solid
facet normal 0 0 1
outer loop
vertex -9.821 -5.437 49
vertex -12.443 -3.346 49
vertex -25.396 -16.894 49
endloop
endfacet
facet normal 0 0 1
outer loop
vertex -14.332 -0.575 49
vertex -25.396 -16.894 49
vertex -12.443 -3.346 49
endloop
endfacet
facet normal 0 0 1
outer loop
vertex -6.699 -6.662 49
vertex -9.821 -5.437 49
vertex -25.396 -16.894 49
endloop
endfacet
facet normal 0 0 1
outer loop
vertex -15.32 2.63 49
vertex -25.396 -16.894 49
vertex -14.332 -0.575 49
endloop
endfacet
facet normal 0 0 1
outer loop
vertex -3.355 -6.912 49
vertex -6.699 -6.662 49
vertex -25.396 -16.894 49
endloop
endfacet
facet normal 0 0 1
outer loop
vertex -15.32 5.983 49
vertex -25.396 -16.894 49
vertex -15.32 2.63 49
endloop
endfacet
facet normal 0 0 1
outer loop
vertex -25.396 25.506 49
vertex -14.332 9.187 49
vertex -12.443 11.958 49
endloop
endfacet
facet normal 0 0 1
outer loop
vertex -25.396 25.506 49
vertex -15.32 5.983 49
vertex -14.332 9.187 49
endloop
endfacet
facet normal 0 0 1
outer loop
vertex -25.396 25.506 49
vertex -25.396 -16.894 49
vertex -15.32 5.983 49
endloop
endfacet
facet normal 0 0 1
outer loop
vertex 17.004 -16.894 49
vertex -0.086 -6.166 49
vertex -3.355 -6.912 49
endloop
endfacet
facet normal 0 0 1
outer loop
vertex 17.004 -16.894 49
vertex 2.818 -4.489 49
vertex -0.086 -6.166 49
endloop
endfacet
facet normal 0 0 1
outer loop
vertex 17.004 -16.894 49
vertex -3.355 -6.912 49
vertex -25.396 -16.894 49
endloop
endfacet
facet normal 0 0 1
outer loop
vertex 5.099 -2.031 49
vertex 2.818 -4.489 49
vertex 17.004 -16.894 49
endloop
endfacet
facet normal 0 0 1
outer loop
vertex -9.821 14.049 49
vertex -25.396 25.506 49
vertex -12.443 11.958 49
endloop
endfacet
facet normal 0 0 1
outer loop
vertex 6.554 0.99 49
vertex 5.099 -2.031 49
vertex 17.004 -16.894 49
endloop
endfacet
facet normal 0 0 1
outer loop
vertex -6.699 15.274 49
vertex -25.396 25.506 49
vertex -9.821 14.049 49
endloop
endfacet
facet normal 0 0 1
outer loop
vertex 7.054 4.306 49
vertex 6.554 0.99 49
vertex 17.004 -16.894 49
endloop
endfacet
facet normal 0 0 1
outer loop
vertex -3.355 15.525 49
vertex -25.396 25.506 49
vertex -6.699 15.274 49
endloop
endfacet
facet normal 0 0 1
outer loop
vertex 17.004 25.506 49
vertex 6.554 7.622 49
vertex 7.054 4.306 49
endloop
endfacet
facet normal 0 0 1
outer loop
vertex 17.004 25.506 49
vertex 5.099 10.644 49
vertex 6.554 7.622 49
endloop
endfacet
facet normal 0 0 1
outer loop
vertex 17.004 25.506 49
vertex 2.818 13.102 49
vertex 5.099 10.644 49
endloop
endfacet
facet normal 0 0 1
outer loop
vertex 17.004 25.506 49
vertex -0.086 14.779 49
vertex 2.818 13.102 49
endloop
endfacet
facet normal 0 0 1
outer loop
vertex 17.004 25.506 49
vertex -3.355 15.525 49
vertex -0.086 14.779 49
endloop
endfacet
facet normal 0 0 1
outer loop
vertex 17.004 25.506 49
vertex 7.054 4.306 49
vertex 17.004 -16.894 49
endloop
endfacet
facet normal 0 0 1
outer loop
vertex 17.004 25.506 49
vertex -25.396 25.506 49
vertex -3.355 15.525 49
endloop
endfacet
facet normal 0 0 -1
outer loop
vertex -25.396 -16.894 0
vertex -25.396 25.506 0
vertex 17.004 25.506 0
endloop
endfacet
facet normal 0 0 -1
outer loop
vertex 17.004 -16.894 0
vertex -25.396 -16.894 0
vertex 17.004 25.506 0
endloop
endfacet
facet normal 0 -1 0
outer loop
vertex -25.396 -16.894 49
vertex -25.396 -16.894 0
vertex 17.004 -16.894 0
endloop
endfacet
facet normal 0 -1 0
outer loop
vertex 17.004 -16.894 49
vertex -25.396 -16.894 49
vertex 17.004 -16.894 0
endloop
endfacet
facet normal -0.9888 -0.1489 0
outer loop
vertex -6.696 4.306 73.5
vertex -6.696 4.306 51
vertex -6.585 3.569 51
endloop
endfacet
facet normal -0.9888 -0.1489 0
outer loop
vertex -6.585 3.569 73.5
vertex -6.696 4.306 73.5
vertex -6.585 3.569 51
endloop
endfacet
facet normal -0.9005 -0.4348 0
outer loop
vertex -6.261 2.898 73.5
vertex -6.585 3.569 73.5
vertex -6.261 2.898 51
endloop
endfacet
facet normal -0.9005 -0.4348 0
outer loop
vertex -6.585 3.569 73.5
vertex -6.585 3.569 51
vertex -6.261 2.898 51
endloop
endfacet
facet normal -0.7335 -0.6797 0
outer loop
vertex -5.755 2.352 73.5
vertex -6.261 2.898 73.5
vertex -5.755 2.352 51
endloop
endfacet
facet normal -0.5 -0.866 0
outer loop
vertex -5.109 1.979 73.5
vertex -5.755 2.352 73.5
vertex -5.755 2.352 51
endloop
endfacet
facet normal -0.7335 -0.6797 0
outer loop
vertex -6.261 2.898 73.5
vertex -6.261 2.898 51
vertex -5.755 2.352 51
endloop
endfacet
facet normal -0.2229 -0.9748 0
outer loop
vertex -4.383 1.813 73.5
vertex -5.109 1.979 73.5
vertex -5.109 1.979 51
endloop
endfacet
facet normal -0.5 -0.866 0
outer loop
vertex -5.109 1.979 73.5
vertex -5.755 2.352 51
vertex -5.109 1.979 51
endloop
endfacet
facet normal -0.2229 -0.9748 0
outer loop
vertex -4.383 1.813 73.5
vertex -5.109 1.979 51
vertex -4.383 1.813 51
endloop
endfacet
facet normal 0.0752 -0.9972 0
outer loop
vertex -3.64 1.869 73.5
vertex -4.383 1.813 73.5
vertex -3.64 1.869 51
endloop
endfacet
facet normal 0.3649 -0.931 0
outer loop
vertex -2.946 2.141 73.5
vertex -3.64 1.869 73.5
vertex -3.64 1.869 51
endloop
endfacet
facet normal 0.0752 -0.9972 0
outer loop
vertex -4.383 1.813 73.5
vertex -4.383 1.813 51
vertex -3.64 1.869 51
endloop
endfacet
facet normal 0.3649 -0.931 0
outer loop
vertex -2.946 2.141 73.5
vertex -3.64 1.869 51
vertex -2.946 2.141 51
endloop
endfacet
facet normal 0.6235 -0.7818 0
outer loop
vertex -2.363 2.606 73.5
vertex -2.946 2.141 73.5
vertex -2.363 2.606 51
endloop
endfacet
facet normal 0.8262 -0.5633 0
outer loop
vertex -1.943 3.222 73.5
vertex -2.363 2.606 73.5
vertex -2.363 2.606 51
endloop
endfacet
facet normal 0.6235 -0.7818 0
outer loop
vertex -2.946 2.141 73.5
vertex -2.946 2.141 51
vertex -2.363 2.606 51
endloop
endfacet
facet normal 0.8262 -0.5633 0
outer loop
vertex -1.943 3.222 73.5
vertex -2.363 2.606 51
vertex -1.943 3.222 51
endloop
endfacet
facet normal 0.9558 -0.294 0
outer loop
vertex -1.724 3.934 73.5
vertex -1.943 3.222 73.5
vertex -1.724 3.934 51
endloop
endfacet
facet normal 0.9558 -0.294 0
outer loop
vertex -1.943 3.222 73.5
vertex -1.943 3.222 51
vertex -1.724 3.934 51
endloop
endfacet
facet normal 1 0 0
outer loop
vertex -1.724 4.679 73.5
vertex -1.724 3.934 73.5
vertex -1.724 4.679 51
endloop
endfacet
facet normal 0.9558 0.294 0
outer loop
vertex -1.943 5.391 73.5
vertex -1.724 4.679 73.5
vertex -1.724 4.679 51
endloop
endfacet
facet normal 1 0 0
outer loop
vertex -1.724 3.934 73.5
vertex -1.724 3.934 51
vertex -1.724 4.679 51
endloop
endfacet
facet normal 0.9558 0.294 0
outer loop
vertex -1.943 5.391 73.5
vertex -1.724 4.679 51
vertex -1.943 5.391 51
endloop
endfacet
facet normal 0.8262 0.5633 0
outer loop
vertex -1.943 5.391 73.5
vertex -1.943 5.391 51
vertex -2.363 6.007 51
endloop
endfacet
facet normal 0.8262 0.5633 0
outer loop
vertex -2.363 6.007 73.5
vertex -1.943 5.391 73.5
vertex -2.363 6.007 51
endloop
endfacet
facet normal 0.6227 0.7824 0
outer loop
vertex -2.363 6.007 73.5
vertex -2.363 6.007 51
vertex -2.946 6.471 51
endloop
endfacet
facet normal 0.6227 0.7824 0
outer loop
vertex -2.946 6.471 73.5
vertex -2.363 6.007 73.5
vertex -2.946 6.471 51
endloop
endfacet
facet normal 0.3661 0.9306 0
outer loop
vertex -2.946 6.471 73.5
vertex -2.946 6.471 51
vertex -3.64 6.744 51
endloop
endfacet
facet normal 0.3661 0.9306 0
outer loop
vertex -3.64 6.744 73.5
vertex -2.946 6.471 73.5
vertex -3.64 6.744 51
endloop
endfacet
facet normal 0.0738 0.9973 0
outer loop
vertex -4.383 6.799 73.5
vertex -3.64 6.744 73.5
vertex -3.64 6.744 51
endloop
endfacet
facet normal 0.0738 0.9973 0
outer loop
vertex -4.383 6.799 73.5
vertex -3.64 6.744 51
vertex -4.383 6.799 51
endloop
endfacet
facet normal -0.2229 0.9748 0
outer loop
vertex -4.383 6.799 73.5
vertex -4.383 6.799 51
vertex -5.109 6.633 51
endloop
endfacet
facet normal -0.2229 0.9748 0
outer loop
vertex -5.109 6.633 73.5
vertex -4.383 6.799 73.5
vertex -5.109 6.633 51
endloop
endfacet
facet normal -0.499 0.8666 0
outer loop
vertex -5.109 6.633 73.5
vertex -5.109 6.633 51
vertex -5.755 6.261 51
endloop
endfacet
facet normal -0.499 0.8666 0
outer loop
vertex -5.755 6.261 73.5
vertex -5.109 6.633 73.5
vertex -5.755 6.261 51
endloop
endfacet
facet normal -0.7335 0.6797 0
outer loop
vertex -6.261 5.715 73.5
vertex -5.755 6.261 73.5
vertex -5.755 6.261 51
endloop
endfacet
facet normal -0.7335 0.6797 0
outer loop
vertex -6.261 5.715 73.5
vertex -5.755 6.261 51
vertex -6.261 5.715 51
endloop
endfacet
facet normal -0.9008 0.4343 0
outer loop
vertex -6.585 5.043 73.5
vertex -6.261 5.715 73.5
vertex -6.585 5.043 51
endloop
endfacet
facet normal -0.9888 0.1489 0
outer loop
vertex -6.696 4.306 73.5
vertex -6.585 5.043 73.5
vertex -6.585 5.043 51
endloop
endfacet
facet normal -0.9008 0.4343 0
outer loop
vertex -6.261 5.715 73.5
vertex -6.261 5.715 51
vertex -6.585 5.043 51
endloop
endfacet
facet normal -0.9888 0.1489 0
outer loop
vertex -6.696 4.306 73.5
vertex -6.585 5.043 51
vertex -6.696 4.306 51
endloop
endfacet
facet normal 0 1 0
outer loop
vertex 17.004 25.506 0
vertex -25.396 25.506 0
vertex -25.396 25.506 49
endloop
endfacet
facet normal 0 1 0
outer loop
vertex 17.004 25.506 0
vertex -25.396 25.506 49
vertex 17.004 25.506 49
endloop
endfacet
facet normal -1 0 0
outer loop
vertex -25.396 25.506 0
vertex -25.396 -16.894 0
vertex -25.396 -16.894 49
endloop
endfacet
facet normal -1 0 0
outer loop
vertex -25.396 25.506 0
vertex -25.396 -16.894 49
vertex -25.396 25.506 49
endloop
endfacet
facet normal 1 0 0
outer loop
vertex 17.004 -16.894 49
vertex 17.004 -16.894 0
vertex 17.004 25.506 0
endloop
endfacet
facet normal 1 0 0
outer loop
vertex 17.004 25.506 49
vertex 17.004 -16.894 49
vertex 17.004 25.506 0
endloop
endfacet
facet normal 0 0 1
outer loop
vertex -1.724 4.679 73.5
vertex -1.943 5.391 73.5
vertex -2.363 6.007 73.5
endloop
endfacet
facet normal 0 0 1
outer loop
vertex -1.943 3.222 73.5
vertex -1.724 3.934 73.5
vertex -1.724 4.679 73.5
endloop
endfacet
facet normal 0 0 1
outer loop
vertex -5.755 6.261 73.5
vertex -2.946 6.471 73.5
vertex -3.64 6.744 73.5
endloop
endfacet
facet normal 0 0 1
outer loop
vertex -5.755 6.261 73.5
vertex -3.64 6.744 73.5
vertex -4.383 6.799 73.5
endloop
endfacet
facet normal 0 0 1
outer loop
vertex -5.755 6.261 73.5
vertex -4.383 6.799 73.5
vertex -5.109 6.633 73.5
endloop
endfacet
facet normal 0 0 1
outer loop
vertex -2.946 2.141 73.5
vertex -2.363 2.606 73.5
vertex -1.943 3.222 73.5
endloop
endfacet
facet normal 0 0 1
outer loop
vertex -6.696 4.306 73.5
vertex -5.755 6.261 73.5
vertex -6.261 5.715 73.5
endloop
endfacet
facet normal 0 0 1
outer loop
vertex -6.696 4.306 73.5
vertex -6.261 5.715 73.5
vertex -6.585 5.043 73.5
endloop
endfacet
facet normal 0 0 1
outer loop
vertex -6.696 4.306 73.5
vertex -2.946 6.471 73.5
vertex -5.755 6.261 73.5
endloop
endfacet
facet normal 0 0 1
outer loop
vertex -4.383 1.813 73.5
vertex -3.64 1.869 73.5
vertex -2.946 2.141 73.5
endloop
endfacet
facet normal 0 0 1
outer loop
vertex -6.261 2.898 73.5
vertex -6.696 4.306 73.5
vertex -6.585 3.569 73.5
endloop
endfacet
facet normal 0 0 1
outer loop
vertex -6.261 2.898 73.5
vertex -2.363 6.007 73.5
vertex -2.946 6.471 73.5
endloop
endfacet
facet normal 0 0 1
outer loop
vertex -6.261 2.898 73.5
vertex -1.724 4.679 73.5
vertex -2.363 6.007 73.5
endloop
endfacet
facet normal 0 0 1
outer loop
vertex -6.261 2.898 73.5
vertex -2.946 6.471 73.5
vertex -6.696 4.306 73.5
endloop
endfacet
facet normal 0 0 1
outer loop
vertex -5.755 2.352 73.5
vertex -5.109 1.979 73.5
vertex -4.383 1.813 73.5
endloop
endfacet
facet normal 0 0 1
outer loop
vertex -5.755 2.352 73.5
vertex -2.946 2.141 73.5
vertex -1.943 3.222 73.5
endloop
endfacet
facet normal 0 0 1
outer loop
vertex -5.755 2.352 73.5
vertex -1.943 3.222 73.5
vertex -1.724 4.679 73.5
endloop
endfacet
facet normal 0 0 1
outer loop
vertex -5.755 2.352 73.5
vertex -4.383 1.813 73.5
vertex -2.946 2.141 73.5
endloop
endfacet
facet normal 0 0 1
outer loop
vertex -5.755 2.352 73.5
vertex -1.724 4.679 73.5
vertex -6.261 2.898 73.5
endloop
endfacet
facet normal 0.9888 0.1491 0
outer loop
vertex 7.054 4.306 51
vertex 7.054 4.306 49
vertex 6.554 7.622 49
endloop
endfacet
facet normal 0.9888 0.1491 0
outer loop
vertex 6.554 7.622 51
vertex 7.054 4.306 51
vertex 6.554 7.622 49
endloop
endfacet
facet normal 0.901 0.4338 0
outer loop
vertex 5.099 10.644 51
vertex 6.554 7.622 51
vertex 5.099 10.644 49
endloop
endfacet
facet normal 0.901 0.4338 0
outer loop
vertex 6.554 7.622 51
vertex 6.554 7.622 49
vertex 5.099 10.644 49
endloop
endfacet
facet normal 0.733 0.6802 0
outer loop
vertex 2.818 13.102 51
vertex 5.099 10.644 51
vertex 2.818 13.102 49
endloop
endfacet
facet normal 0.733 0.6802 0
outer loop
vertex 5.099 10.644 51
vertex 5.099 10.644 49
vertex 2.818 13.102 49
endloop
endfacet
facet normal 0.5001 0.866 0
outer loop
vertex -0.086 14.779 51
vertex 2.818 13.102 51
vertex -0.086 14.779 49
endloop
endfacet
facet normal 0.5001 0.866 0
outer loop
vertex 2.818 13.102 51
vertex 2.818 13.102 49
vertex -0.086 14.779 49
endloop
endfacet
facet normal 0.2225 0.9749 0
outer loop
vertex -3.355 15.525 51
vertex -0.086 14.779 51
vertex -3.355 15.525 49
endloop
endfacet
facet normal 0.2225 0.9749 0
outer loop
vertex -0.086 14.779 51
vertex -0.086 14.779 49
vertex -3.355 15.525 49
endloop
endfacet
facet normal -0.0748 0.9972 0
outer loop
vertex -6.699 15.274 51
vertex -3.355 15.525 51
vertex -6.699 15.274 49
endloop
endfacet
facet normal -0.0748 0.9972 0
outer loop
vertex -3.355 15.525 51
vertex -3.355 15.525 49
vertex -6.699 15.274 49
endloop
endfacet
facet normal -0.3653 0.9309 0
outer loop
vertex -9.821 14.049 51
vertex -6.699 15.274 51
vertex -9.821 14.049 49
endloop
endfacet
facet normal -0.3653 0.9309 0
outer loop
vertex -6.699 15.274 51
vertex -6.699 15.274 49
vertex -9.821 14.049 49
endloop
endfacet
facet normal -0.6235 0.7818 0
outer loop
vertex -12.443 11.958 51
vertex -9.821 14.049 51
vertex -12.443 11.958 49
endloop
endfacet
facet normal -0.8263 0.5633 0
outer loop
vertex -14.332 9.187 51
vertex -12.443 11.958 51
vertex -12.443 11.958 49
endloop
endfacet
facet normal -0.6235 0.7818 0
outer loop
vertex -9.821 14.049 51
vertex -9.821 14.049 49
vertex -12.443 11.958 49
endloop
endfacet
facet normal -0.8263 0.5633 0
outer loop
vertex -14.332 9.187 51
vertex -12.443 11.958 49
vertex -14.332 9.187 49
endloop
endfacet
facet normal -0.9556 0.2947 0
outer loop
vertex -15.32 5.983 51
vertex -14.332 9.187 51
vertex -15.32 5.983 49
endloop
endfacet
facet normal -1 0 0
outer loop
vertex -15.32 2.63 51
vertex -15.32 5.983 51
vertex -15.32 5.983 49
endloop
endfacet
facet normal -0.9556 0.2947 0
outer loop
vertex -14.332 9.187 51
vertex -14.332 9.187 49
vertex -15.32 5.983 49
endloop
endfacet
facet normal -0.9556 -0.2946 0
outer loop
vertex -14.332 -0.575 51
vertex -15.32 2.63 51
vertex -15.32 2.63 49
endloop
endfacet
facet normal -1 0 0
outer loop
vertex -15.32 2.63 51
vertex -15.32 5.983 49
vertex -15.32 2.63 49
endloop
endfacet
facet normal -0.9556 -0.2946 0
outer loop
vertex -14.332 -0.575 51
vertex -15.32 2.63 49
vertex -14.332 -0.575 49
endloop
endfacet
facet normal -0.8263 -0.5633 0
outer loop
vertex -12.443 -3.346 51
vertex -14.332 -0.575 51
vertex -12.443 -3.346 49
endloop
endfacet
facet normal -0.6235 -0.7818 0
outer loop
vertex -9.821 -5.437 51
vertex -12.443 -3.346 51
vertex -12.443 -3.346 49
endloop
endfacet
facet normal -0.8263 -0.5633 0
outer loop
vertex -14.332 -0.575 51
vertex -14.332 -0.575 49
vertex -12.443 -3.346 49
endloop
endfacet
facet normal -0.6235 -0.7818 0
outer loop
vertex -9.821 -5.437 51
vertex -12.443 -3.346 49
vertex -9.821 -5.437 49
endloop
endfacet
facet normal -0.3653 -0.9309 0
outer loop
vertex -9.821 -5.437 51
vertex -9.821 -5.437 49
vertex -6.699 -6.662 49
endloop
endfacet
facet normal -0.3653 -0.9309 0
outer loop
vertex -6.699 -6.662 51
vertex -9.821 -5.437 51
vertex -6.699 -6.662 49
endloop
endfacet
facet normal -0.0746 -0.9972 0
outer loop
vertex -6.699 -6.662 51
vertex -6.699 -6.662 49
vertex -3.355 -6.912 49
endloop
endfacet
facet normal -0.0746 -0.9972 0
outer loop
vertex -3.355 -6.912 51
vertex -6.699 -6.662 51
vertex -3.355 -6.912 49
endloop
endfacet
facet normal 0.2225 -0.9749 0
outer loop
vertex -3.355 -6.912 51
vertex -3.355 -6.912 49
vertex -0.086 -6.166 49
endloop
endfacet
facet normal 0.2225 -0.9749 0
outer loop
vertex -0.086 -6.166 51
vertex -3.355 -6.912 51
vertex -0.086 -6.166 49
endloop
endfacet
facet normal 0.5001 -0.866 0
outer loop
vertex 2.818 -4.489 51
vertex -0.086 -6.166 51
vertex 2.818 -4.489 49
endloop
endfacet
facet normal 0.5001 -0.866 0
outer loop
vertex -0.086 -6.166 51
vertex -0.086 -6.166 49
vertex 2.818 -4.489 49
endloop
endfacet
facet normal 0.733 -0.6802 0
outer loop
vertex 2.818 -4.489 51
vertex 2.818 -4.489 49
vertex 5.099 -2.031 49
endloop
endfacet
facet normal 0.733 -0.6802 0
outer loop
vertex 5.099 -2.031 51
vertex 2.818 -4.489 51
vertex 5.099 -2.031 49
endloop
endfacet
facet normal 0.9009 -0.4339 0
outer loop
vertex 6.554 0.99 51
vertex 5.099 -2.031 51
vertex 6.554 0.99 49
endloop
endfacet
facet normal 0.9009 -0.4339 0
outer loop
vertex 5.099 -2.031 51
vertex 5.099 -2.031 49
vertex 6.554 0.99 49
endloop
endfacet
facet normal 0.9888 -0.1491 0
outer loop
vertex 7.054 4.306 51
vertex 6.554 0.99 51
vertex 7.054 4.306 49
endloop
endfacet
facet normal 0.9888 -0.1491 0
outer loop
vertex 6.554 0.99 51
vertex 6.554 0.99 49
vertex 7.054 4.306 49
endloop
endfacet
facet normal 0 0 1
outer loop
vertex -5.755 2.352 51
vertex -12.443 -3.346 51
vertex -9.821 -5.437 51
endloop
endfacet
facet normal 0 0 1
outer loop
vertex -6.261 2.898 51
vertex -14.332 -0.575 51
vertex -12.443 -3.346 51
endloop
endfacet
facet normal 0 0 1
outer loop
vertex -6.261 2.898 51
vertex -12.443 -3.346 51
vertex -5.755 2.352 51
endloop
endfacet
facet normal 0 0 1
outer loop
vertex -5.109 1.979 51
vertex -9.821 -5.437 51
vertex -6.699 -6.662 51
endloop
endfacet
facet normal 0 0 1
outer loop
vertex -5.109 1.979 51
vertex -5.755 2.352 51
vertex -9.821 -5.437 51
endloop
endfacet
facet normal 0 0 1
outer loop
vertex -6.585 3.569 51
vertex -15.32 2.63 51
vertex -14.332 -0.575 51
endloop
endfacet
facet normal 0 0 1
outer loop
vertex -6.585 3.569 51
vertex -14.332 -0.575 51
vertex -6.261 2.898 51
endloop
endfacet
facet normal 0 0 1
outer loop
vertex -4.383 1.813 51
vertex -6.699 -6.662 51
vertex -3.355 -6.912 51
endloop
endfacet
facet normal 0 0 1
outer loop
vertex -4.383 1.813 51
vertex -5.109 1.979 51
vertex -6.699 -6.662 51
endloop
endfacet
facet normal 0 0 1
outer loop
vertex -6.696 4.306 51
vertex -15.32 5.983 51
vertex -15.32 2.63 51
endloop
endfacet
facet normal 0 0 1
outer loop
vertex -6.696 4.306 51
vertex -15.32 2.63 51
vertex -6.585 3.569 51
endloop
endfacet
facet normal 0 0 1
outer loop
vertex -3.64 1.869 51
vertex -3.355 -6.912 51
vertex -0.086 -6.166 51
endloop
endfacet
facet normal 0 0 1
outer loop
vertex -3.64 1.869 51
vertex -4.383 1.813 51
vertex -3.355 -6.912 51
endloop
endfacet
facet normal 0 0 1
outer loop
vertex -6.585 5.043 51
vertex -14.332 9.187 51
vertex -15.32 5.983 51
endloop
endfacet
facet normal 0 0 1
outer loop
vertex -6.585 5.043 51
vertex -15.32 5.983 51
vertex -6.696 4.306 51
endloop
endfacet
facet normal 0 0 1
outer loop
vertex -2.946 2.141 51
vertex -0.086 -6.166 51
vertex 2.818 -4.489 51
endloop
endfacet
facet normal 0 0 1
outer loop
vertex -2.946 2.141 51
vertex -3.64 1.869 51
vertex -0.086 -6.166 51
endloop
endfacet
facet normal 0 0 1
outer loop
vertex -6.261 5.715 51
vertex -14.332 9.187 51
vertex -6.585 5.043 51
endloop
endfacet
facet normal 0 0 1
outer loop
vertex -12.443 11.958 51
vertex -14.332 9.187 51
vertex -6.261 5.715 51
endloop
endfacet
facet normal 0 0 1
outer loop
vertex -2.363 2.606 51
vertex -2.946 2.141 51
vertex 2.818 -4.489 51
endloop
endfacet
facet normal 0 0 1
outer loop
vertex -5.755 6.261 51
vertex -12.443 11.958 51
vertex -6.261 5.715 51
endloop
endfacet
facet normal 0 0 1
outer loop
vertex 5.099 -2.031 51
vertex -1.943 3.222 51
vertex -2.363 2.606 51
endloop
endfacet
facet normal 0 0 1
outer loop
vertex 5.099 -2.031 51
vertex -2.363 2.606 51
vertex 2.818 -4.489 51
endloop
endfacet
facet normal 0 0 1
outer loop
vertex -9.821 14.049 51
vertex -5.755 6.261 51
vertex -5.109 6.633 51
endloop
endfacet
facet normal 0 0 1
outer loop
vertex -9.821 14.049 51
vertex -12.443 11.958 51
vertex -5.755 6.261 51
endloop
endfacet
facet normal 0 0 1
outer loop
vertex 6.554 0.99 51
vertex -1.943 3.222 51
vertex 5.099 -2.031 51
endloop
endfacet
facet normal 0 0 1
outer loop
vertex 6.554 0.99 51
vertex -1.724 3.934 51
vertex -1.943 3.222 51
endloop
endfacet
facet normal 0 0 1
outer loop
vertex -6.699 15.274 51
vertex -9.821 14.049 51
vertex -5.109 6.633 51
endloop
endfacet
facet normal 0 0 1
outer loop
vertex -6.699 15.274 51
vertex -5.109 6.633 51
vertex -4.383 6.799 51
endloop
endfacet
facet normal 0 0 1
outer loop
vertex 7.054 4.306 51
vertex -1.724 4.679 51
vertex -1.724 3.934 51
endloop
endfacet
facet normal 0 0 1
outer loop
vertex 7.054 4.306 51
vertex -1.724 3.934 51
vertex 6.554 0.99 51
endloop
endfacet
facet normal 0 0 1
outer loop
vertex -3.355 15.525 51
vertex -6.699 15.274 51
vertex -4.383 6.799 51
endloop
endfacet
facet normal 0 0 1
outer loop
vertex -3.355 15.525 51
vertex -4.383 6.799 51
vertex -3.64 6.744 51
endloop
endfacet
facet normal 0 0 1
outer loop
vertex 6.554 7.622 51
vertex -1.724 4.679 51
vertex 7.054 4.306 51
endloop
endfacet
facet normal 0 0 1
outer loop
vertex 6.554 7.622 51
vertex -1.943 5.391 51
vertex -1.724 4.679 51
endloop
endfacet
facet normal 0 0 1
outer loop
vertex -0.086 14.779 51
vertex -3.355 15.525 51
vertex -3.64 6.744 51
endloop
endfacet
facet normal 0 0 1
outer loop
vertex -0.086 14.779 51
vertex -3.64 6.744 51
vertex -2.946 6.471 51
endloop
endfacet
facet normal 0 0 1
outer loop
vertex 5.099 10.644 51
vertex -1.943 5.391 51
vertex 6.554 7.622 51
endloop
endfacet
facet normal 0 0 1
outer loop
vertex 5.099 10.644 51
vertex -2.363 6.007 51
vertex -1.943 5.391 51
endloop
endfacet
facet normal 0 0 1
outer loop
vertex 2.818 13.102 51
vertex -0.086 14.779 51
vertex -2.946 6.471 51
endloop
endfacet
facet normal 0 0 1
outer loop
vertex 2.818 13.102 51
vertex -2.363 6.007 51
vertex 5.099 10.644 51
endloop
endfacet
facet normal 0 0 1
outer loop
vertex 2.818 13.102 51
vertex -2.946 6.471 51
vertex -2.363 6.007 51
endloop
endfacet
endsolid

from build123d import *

# Parameters (mm, degrees)
SKETCH1_W           = 42.4
SKETCH1_H           = 42.4
BOSS_EXTRUDE1_DEPTH = 49
SKETCH2_R           = 11.25
BOSS_EXTRUDE2_DEPTH = 2
SKETCH3_R           = 2.5
BOSS_EXTRUDE3_DEPTH = 22.5


with BuildPart() as part:
    # Sketch1 → Boss-Extrude1 (new body)
    with BuildSketch(Plane.XY):
        with Locations((-4.195833333, 4.30625)):
            Rectangle(SKETCH1_W, SKETCH1_H)
    extrude(amount=BOSS_EXTRUDE1_DEPTH)

    # Sketch2 → Boss-Extrude2 (add)
    with BuildSketch(Plane.XY.offset(49)):
        with Locations((-4.195833333, 4.30625)):
            Circle(SKETCH2_R)
    extrude(amount=BOSS_EXTRUDE2_DEPTH)

    # Sketch3 → Boss-Extrude3 (add)
    with BuildSketch(Plane.XY.offset(51)):
        with Locations(Location((-4.195833333, 4.30625, 0), (0, 0, 180))):
            Circle(SKETCH3_R)
    extrude(amount=BOSS_EXTRUDE3_DEPTH)


solid = part.part
